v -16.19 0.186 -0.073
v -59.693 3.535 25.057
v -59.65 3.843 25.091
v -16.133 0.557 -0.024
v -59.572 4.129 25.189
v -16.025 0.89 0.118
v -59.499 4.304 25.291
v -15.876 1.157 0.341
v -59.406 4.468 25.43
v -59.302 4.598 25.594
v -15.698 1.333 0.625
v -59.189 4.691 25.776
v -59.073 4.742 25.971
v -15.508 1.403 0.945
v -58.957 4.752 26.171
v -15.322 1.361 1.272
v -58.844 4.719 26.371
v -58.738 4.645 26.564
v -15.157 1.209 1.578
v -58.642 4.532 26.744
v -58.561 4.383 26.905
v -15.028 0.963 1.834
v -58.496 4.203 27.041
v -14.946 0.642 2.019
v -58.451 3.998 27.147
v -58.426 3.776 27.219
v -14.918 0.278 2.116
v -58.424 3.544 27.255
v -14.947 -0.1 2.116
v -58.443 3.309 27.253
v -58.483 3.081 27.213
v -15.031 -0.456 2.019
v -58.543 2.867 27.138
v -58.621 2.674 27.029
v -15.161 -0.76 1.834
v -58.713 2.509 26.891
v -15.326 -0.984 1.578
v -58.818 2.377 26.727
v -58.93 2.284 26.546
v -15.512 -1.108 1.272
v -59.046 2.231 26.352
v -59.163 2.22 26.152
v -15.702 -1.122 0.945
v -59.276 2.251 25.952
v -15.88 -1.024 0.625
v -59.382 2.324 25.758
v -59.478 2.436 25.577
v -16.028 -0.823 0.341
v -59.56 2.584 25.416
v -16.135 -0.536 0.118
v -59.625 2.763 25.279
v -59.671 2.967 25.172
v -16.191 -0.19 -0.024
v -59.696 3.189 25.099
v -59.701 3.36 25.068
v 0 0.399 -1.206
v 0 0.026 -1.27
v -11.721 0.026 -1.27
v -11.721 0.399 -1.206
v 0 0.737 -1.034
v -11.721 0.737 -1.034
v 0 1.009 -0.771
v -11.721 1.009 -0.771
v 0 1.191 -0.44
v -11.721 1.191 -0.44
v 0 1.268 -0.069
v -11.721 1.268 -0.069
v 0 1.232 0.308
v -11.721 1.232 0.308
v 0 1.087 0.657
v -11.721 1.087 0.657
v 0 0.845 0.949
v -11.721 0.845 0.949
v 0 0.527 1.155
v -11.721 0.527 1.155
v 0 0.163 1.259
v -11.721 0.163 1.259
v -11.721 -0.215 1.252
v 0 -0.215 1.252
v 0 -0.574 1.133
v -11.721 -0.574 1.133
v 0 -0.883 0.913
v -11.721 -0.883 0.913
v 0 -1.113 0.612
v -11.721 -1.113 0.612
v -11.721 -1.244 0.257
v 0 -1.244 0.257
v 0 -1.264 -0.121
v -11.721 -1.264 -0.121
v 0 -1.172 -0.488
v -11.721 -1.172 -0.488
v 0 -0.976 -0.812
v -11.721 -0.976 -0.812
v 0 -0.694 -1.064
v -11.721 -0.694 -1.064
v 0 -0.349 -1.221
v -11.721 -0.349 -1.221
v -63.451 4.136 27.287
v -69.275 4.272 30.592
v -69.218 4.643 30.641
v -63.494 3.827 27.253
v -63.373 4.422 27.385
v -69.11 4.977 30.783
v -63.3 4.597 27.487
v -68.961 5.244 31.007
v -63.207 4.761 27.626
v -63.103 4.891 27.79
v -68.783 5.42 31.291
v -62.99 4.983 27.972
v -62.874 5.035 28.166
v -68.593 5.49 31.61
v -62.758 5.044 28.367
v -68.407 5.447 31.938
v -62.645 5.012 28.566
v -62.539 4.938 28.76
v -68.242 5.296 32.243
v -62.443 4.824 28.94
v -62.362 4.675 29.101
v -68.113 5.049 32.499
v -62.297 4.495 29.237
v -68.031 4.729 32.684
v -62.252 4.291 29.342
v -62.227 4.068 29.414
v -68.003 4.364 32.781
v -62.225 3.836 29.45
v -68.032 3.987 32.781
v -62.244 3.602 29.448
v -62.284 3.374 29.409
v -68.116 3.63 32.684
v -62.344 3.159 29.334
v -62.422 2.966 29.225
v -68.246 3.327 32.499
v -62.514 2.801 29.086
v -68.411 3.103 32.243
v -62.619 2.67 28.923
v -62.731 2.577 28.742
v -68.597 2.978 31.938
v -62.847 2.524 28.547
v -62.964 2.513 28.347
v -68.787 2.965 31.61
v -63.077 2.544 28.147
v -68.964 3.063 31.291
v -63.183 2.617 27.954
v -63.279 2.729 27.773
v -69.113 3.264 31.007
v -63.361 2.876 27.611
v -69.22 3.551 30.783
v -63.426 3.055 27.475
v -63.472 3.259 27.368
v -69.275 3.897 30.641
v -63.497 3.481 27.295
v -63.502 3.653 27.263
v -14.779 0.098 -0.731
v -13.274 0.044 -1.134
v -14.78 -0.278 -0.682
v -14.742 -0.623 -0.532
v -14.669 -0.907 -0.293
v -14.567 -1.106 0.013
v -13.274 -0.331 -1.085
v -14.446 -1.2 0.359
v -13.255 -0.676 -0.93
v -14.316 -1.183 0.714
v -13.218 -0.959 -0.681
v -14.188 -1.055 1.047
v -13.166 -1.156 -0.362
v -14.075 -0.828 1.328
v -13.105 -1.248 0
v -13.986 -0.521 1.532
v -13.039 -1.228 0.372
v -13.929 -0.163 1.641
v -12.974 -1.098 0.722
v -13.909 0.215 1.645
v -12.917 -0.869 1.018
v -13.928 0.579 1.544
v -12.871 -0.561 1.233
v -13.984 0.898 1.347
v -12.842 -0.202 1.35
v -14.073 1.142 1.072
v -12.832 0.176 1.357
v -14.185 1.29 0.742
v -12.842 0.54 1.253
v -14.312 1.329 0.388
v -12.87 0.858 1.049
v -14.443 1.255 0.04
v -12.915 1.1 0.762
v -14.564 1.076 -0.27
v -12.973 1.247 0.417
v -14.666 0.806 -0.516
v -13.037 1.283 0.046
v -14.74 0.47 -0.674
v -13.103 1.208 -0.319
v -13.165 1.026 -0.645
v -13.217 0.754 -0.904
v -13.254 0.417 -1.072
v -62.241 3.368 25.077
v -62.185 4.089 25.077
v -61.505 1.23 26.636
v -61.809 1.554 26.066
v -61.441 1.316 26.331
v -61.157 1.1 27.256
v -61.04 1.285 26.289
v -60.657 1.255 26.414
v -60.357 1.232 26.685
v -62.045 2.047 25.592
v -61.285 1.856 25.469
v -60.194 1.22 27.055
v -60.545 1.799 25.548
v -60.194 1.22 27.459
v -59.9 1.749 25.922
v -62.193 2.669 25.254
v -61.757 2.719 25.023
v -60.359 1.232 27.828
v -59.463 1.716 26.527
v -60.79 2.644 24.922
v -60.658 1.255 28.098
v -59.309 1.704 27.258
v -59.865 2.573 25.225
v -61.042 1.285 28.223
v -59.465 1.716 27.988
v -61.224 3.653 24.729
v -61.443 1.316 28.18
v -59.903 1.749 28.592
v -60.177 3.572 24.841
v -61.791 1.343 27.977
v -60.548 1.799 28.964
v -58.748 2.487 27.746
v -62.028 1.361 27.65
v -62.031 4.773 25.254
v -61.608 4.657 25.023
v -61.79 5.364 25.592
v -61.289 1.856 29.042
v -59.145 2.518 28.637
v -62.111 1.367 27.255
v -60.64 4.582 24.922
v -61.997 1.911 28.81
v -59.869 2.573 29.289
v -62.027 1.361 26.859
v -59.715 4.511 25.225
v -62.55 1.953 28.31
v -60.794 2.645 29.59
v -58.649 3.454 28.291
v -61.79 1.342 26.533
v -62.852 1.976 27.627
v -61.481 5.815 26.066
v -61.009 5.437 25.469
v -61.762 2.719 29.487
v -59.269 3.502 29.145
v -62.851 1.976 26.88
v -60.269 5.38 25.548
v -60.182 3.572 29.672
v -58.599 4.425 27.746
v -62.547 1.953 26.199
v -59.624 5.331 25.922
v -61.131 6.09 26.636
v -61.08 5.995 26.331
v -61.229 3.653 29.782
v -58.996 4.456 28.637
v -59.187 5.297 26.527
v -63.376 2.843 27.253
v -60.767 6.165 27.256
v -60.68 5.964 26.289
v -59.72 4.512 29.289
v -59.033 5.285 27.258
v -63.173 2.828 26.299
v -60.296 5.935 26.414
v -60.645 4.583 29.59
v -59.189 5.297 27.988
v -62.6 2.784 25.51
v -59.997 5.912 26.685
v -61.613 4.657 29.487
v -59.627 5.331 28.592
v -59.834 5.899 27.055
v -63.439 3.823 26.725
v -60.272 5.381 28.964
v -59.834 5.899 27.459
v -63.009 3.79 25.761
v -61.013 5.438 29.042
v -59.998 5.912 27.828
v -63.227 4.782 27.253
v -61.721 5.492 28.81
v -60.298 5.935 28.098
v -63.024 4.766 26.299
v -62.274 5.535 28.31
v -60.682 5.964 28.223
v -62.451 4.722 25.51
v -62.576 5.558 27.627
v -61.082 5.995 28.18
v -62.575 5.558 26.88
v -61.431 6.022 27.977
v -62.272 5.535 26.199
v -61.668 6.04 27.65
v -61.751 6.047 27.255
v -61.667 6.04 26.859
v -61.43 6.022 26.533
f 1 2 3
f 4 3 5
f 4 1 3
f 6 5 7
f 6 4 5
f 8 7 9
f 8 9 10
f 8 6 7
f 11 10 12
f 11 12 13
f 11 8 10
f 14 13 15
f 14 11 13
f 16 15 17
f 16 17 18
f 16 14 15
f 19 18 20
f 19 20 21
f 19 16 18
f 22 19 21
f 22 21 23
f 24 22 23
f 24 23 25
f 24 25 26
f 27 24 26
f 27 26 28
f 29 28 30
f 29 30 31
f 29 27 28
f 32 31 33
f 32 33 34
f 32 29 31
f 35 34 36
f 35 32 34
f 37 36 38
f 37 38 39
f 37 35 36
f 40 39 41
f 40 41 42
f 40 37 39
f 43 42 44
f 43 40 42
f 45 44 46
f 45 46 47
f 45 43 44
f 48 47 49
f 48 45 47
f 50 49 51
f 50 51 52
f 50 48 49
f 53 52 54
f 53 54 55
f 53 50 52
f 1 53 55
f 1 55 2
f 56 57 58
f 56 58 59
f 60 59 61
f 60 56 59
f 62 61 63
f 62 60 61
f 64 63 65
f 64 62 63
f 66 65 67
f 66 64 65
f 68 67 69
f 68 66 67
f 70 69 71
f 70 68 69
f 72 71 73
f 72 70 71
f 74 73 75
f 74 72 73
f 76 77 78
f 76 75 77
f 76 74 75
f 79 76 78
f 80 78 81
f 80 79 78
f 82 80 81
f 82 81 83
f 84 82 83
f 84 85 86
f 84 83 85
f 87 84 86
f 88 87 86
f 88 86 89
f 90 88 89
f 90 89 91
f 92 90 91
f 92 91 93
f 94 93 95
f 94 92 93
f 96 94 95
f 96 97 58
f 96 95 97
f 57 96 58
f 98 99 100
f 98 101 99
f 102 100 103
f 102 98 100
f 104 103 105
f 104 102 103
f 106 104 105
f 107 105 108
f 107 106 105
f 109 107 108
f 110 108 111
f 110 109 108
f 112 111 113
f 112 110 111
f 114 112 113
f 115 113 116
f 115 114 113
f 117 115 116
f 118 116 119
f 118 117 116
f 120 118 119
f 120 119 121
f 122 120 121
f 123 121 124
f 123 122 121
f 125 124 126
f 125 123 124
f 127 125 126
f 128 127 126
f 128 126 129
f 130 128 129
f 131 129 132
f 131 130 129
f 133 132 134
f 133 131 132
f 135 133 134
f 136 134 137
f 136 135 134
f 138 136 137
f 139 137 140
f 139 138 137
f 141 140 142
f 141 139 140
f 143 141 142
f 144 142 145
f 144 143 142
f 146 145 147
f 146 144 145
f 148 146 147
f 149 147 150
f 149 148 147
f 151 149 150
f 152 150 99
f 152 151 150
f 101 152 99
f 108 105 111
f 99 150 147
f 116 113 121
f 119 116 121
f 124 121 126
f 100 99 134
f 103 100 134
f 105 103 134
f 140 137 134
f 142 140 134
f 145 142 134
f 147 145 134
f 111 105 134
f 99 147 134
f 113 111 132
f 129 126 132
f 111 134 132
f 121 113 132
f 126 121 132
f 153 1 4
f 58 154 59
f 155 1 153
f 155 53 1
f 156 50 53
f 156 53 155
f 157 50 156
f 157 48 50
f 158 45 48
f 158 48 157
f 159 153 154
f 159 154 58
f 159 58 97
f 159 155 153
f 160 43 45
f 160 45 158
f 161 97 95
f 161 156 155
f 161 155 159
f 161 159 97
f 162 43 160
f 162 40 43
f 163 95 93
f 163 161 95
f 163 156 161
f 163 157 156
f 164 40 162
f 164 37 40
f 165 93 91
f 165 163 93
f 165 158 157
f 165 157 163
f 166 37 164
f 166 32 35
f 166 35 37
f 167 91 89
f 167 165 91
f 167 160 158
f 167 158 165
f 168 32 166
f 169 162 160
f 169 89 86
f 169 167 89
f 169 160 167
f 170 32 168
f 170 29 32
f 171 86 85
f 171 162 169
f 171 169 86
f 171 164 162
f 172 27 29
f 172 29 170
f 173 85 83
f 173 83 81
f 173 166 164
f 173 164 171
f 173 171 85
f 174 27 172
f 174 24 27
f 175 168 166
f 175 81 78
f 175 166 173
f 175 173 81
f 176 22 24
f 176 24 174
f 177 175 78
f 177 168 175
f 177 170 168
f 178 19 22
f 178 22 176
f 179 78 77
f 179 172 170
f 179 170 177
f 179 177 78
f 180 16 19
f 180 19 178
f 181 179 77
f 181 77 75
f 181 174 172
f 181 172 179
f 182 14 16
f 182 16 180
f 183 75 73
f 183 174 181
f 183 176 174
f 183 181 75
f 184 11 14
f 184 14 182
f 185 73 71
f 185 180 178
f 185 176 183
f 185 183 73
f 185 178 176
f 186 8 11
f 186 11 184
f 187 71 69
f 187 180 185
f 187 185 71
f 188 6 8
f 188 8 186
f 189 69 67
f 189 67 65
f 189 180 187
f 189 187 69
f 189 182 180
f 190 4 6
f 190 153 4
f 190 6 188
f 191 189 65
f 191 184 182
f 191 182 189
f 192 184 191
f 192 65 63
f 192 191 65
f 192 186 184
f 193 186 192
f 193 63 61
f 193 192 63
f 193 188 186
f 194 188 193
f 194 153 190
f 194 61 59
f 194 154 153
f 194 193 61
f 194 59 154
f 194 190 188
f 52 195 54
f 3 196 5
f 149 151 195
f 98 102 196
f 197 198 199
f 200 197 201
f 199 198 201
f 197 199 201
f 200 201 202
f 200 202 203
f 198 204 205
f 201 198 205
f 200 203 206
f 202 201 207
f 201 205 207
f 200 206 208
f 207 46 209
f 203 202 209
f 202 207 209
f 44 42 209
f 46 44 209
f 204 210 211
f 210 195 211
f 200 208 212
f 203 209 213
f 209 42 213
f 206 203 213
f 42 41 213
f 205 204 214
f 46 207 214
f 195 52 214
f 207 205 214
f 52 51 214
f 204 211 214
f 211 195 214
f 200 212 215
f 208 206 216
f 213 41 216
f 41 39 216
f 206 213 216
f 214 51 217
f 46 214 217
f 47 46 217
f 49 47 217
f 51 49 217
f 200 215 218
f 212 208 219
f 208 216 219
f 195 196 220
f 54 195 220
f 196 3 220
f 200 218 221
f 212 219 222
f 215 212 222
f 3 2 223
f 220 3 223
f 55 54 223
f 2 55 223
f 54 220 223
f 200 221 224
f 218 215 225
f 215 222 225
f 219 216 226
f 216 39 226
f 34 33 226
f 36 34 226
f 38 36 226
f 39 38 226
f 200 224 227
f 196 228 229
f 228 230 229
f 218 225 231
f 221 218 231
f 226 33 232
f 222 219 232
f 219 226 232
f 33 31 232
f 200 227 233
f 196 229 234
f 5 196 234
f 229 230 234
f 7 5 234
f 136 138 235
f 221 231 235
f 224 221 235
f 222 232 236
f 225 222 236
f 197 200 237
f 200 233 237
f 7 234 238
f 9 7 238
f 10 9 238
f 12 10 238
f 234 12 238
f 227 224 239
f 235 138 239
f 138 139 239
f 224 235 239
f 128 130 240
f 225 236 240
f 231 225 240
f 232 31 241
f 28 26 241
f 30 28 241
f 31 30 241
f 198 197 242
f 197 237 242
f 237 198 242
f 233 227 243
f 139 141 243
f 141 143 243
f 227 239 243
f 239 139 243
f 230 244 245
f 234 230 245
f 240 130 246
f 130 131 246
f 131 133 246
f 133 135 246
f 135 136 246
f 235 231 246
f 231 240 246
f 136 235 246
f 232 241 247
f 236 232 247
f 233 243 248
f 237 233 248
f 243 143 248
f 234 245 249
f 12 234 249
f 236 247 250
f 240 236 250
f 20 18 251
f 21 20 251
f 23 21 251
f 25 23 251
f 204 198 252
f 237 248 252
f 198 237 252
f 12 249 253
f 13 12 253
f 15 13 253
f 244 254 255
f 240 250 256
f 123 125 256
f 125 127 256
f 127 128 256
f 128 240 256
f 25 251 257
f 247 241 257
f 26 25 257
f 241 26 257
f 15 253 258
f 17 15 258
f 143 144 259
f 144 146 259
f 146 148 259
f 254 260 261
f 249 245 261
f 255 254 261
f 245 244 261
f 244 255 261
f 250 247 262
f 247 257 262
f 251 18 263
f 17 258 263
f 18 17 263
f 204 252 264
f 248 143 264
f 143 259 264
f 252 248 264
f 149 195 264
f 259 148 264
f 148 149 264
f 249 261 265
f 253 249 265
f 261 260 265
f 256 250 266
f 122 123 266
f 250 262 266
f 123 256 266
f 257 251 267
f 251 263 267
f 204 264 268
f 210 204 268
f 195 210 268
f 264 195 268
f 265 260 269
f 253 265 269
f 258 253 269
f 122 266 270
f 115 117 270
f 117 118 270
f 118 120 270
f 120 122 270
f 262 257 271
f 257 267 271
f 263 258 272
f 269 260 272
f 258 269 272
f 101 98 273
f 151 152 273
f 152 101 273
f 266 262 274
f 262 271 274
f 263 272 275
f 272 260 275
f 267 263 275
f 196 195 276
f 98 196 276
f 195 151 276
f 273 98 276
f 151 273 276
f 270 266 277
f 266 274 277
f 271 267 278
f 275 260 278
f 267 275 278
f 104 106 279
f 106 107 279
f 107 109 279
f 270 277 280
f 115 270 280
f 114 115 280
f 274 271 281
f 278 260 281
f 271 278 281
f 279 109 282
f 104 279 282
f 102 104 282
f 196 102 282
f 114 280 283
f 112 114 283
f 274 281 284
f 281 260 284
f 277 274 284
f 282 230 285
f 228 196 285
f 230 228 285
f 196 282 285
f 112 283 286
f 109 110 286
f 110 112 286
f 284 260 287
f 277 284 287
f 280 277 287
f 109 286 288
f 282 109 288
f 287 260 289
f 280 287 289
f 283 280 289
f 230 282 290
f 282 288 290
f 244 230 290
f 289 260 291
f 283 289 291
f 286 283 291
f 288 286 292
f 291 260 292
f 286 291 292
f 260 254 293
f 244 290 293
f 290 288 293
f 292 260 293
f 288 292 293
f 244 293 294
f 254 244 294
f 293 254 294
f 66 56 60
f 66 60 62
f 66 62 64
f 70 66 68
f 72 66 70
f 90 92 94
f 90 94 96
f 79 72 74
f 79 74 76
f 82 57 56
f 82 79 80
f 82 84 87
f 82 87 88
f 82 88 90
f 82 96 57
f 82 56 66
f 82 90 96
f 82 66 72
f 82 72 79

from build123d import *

# Parameters (mm, degrees)
SKETCH1_R = 1.27


with BuildPart() as part:
    # Sweep1: sweep along a curve in space
    with BuildLine() as sweep1_path:
        Line((-68.642810089, 4.223652332, 31.692711576), (-15.557895559, 0.136909795, 1.027320033))
        ThreePointArc((-15.557895559, 0.136909795, 1.027320033), (-13.708278185, 0.034830032, 0.261351566), (-11.721145923, 0, 0))
        Line((-11.721145923, 0, 0), (0, 0, 0))
    # Sketch1 → Sweep1 (sweep)
    with BuildSketch(Plane(origin=(-68.642810089, 4.223652332, 31.692711576), x_dir=(-0.4976253626044802, 0.038309692214518805, -0.8665456514086194), z_dir=(0.8639891352609107, -0.06651420995766534, -0.4990978200962329))):
        Circle(SKETCH1_R)
    sweep(path=sweep1_path.line)

    # Sketch2 → Revolve1 (revolve)
    with BuildSketch(Plane(origin=(-60.961946677, 3.632341006, 27.255731955), x_dir=(-0.4976253626044802, 0.038309692214518805, -0.8665456514086194), z_dir=(0.8639891352609107, -0.06651420995766534, -0.4990978200962329))):
        with BuildLine():
            Line((0, 2.54), (0, -2.54))
            ThreePointArc((0, -2.54), (2.54, 0), (0, 2.54))
        make_face()
    revolve(axis=Axis((-60.766981653, 6.164847401, 27.255731955), (-0.07675788326851926, -0.997049761725129, 0)))


solid = part.part
